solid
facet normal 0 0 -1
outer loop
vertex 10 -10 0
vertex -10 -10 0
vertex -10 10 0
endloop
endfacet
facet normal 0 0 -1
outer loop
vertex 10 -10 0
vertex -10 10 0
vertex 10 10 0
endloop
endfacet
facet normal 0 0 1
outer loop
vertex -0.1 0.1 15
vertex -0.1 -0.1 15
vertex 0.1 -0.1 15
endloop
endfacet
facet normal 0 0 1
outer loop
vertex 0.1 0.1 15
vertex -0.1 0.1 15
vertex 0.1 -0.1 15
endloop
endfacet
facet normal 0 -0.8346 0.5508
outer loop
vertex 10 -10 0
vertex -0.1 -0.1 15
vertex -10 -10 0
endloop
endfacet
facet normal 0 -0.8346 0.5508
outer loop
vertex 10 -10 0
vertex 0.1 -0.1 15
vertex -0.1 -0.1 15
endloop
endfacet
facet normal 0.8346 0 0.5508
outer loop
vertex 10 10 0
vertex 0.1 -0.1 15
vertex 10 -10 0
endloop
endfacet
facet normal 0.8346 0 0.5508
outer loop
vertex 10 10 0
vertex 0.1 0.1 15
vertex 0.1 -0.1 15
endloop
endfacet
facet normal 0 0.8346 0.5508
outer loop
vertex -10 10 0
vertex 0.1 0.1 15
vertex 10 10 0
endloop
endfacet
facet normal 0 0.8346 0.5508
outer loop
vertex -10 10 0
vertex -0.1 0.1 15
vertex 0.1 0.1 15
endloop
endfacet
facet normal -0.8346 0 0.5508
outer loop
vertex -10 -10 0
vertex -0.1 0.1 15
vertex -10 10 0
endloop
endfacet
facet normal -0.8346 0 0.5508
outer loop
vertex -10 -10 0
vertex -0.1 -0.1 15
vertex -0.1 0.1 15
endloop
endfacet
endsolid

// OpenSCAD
// param: base_size=20, height=15
module pyramid(base_size=20, height=15) {
    linear_extrude(height=height, scale=0.01) square(base_size, center=true);
}
pyramid(base_size=20, height=15);
